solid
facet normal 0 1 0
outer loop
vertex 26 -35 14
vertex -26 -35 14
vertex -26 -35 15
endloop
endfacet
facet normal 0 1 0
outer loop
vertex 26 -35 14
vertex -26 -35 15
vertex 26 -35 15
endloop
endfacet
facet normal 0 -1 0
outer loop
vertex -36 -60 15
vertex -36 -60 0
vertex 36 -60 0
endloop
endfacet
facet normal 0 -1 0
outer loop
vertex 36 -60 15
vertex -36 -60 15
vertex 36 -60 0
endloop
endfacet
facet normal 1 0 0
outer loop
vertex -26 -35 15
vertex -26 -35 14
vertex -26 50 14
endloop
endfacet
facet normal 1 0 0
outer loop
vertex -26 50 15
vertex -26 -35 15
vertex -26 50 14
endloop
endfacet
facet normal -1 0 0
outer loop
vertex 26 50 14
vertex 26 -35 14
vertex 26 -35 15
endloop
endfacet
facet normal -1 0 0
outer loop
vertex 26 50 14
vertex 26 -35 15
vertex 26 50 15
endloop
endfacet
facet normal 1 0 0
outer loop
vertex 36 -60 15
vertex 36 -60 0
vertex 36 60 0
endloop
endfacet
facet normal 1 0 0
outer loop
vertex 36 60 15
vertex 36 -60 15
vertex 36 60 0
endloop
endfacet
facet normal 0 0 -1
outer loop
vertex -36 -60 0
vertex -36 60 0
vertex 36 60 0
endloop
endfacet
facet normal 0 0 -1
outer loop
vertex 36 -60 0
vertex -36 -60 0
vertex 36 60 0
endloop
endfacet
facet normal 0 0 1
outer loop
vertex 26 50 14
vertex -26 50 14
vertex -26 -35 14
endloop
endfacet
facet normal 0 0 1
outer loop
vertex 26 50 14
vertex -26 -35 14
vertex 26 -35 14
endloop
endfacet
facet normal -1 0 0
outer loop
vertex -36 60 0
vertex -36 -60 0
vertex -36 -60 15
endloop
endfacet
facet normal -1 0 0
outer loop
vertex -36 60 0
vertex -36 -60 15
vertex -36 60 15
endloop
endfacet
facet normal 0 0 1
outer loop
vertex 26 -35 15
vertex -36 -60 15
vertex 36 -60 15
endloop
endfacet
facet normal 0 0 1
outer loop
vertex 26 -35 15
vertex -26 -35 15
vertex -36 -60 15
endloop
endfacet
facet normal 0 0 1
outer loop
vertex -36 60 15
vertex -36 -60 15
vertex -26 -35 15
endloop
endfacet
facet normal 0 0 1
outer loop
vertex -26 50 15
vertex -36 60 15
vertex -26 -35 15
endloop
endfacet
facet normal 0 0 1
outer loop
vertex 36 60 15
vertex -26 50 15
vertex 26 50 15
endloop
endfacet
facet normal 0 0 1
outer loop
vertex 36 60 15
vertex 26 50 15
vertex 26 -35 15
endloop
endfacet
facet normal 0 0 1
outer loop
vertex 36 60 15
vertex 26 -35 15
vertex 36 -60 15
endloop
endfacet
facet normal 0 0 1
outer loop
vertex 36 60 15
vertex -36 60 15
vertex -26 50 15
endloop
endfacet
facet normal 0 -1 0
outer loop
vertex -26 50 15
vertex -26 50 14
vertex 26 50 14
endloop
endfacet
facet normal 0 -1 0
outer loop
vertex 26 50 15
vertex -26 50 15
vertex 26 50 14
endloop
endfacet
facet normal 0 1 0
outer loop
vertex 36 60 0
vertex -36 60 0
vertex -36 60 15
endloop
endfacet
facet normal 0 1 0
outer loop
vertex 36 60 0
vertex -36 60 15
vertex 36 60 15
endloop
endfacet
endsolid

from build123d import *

# Parameters (mm, degrees)
F0_W     = 72
F0_H     = 120
F0_W_2   = 52
F0_H_2   = 85
F1_DEPTH = 15
F2_DEPTH = 14


with BuildPart() as f1:
    # F0 (on Top) → F1 (new body)
    with BuildSketch(Plane.XY):
        Rectangle(F0_W, F0_H)
        with Locations((0, 7.5)):
            Rectangle(F0_W_2, F0_H_2, mode=Mode.SUBTRACT)
    extrude(amount=F1_DEPTH)

    # F0 (on Top) → F2 (join)
    with BuildSketch(Plane.XY):
        with Locations((0, 7.5)):
            Rectangle(F0_W_2, F0_H_2)
    extrude(amount=F2_DEPTH)


solid = f1.part
